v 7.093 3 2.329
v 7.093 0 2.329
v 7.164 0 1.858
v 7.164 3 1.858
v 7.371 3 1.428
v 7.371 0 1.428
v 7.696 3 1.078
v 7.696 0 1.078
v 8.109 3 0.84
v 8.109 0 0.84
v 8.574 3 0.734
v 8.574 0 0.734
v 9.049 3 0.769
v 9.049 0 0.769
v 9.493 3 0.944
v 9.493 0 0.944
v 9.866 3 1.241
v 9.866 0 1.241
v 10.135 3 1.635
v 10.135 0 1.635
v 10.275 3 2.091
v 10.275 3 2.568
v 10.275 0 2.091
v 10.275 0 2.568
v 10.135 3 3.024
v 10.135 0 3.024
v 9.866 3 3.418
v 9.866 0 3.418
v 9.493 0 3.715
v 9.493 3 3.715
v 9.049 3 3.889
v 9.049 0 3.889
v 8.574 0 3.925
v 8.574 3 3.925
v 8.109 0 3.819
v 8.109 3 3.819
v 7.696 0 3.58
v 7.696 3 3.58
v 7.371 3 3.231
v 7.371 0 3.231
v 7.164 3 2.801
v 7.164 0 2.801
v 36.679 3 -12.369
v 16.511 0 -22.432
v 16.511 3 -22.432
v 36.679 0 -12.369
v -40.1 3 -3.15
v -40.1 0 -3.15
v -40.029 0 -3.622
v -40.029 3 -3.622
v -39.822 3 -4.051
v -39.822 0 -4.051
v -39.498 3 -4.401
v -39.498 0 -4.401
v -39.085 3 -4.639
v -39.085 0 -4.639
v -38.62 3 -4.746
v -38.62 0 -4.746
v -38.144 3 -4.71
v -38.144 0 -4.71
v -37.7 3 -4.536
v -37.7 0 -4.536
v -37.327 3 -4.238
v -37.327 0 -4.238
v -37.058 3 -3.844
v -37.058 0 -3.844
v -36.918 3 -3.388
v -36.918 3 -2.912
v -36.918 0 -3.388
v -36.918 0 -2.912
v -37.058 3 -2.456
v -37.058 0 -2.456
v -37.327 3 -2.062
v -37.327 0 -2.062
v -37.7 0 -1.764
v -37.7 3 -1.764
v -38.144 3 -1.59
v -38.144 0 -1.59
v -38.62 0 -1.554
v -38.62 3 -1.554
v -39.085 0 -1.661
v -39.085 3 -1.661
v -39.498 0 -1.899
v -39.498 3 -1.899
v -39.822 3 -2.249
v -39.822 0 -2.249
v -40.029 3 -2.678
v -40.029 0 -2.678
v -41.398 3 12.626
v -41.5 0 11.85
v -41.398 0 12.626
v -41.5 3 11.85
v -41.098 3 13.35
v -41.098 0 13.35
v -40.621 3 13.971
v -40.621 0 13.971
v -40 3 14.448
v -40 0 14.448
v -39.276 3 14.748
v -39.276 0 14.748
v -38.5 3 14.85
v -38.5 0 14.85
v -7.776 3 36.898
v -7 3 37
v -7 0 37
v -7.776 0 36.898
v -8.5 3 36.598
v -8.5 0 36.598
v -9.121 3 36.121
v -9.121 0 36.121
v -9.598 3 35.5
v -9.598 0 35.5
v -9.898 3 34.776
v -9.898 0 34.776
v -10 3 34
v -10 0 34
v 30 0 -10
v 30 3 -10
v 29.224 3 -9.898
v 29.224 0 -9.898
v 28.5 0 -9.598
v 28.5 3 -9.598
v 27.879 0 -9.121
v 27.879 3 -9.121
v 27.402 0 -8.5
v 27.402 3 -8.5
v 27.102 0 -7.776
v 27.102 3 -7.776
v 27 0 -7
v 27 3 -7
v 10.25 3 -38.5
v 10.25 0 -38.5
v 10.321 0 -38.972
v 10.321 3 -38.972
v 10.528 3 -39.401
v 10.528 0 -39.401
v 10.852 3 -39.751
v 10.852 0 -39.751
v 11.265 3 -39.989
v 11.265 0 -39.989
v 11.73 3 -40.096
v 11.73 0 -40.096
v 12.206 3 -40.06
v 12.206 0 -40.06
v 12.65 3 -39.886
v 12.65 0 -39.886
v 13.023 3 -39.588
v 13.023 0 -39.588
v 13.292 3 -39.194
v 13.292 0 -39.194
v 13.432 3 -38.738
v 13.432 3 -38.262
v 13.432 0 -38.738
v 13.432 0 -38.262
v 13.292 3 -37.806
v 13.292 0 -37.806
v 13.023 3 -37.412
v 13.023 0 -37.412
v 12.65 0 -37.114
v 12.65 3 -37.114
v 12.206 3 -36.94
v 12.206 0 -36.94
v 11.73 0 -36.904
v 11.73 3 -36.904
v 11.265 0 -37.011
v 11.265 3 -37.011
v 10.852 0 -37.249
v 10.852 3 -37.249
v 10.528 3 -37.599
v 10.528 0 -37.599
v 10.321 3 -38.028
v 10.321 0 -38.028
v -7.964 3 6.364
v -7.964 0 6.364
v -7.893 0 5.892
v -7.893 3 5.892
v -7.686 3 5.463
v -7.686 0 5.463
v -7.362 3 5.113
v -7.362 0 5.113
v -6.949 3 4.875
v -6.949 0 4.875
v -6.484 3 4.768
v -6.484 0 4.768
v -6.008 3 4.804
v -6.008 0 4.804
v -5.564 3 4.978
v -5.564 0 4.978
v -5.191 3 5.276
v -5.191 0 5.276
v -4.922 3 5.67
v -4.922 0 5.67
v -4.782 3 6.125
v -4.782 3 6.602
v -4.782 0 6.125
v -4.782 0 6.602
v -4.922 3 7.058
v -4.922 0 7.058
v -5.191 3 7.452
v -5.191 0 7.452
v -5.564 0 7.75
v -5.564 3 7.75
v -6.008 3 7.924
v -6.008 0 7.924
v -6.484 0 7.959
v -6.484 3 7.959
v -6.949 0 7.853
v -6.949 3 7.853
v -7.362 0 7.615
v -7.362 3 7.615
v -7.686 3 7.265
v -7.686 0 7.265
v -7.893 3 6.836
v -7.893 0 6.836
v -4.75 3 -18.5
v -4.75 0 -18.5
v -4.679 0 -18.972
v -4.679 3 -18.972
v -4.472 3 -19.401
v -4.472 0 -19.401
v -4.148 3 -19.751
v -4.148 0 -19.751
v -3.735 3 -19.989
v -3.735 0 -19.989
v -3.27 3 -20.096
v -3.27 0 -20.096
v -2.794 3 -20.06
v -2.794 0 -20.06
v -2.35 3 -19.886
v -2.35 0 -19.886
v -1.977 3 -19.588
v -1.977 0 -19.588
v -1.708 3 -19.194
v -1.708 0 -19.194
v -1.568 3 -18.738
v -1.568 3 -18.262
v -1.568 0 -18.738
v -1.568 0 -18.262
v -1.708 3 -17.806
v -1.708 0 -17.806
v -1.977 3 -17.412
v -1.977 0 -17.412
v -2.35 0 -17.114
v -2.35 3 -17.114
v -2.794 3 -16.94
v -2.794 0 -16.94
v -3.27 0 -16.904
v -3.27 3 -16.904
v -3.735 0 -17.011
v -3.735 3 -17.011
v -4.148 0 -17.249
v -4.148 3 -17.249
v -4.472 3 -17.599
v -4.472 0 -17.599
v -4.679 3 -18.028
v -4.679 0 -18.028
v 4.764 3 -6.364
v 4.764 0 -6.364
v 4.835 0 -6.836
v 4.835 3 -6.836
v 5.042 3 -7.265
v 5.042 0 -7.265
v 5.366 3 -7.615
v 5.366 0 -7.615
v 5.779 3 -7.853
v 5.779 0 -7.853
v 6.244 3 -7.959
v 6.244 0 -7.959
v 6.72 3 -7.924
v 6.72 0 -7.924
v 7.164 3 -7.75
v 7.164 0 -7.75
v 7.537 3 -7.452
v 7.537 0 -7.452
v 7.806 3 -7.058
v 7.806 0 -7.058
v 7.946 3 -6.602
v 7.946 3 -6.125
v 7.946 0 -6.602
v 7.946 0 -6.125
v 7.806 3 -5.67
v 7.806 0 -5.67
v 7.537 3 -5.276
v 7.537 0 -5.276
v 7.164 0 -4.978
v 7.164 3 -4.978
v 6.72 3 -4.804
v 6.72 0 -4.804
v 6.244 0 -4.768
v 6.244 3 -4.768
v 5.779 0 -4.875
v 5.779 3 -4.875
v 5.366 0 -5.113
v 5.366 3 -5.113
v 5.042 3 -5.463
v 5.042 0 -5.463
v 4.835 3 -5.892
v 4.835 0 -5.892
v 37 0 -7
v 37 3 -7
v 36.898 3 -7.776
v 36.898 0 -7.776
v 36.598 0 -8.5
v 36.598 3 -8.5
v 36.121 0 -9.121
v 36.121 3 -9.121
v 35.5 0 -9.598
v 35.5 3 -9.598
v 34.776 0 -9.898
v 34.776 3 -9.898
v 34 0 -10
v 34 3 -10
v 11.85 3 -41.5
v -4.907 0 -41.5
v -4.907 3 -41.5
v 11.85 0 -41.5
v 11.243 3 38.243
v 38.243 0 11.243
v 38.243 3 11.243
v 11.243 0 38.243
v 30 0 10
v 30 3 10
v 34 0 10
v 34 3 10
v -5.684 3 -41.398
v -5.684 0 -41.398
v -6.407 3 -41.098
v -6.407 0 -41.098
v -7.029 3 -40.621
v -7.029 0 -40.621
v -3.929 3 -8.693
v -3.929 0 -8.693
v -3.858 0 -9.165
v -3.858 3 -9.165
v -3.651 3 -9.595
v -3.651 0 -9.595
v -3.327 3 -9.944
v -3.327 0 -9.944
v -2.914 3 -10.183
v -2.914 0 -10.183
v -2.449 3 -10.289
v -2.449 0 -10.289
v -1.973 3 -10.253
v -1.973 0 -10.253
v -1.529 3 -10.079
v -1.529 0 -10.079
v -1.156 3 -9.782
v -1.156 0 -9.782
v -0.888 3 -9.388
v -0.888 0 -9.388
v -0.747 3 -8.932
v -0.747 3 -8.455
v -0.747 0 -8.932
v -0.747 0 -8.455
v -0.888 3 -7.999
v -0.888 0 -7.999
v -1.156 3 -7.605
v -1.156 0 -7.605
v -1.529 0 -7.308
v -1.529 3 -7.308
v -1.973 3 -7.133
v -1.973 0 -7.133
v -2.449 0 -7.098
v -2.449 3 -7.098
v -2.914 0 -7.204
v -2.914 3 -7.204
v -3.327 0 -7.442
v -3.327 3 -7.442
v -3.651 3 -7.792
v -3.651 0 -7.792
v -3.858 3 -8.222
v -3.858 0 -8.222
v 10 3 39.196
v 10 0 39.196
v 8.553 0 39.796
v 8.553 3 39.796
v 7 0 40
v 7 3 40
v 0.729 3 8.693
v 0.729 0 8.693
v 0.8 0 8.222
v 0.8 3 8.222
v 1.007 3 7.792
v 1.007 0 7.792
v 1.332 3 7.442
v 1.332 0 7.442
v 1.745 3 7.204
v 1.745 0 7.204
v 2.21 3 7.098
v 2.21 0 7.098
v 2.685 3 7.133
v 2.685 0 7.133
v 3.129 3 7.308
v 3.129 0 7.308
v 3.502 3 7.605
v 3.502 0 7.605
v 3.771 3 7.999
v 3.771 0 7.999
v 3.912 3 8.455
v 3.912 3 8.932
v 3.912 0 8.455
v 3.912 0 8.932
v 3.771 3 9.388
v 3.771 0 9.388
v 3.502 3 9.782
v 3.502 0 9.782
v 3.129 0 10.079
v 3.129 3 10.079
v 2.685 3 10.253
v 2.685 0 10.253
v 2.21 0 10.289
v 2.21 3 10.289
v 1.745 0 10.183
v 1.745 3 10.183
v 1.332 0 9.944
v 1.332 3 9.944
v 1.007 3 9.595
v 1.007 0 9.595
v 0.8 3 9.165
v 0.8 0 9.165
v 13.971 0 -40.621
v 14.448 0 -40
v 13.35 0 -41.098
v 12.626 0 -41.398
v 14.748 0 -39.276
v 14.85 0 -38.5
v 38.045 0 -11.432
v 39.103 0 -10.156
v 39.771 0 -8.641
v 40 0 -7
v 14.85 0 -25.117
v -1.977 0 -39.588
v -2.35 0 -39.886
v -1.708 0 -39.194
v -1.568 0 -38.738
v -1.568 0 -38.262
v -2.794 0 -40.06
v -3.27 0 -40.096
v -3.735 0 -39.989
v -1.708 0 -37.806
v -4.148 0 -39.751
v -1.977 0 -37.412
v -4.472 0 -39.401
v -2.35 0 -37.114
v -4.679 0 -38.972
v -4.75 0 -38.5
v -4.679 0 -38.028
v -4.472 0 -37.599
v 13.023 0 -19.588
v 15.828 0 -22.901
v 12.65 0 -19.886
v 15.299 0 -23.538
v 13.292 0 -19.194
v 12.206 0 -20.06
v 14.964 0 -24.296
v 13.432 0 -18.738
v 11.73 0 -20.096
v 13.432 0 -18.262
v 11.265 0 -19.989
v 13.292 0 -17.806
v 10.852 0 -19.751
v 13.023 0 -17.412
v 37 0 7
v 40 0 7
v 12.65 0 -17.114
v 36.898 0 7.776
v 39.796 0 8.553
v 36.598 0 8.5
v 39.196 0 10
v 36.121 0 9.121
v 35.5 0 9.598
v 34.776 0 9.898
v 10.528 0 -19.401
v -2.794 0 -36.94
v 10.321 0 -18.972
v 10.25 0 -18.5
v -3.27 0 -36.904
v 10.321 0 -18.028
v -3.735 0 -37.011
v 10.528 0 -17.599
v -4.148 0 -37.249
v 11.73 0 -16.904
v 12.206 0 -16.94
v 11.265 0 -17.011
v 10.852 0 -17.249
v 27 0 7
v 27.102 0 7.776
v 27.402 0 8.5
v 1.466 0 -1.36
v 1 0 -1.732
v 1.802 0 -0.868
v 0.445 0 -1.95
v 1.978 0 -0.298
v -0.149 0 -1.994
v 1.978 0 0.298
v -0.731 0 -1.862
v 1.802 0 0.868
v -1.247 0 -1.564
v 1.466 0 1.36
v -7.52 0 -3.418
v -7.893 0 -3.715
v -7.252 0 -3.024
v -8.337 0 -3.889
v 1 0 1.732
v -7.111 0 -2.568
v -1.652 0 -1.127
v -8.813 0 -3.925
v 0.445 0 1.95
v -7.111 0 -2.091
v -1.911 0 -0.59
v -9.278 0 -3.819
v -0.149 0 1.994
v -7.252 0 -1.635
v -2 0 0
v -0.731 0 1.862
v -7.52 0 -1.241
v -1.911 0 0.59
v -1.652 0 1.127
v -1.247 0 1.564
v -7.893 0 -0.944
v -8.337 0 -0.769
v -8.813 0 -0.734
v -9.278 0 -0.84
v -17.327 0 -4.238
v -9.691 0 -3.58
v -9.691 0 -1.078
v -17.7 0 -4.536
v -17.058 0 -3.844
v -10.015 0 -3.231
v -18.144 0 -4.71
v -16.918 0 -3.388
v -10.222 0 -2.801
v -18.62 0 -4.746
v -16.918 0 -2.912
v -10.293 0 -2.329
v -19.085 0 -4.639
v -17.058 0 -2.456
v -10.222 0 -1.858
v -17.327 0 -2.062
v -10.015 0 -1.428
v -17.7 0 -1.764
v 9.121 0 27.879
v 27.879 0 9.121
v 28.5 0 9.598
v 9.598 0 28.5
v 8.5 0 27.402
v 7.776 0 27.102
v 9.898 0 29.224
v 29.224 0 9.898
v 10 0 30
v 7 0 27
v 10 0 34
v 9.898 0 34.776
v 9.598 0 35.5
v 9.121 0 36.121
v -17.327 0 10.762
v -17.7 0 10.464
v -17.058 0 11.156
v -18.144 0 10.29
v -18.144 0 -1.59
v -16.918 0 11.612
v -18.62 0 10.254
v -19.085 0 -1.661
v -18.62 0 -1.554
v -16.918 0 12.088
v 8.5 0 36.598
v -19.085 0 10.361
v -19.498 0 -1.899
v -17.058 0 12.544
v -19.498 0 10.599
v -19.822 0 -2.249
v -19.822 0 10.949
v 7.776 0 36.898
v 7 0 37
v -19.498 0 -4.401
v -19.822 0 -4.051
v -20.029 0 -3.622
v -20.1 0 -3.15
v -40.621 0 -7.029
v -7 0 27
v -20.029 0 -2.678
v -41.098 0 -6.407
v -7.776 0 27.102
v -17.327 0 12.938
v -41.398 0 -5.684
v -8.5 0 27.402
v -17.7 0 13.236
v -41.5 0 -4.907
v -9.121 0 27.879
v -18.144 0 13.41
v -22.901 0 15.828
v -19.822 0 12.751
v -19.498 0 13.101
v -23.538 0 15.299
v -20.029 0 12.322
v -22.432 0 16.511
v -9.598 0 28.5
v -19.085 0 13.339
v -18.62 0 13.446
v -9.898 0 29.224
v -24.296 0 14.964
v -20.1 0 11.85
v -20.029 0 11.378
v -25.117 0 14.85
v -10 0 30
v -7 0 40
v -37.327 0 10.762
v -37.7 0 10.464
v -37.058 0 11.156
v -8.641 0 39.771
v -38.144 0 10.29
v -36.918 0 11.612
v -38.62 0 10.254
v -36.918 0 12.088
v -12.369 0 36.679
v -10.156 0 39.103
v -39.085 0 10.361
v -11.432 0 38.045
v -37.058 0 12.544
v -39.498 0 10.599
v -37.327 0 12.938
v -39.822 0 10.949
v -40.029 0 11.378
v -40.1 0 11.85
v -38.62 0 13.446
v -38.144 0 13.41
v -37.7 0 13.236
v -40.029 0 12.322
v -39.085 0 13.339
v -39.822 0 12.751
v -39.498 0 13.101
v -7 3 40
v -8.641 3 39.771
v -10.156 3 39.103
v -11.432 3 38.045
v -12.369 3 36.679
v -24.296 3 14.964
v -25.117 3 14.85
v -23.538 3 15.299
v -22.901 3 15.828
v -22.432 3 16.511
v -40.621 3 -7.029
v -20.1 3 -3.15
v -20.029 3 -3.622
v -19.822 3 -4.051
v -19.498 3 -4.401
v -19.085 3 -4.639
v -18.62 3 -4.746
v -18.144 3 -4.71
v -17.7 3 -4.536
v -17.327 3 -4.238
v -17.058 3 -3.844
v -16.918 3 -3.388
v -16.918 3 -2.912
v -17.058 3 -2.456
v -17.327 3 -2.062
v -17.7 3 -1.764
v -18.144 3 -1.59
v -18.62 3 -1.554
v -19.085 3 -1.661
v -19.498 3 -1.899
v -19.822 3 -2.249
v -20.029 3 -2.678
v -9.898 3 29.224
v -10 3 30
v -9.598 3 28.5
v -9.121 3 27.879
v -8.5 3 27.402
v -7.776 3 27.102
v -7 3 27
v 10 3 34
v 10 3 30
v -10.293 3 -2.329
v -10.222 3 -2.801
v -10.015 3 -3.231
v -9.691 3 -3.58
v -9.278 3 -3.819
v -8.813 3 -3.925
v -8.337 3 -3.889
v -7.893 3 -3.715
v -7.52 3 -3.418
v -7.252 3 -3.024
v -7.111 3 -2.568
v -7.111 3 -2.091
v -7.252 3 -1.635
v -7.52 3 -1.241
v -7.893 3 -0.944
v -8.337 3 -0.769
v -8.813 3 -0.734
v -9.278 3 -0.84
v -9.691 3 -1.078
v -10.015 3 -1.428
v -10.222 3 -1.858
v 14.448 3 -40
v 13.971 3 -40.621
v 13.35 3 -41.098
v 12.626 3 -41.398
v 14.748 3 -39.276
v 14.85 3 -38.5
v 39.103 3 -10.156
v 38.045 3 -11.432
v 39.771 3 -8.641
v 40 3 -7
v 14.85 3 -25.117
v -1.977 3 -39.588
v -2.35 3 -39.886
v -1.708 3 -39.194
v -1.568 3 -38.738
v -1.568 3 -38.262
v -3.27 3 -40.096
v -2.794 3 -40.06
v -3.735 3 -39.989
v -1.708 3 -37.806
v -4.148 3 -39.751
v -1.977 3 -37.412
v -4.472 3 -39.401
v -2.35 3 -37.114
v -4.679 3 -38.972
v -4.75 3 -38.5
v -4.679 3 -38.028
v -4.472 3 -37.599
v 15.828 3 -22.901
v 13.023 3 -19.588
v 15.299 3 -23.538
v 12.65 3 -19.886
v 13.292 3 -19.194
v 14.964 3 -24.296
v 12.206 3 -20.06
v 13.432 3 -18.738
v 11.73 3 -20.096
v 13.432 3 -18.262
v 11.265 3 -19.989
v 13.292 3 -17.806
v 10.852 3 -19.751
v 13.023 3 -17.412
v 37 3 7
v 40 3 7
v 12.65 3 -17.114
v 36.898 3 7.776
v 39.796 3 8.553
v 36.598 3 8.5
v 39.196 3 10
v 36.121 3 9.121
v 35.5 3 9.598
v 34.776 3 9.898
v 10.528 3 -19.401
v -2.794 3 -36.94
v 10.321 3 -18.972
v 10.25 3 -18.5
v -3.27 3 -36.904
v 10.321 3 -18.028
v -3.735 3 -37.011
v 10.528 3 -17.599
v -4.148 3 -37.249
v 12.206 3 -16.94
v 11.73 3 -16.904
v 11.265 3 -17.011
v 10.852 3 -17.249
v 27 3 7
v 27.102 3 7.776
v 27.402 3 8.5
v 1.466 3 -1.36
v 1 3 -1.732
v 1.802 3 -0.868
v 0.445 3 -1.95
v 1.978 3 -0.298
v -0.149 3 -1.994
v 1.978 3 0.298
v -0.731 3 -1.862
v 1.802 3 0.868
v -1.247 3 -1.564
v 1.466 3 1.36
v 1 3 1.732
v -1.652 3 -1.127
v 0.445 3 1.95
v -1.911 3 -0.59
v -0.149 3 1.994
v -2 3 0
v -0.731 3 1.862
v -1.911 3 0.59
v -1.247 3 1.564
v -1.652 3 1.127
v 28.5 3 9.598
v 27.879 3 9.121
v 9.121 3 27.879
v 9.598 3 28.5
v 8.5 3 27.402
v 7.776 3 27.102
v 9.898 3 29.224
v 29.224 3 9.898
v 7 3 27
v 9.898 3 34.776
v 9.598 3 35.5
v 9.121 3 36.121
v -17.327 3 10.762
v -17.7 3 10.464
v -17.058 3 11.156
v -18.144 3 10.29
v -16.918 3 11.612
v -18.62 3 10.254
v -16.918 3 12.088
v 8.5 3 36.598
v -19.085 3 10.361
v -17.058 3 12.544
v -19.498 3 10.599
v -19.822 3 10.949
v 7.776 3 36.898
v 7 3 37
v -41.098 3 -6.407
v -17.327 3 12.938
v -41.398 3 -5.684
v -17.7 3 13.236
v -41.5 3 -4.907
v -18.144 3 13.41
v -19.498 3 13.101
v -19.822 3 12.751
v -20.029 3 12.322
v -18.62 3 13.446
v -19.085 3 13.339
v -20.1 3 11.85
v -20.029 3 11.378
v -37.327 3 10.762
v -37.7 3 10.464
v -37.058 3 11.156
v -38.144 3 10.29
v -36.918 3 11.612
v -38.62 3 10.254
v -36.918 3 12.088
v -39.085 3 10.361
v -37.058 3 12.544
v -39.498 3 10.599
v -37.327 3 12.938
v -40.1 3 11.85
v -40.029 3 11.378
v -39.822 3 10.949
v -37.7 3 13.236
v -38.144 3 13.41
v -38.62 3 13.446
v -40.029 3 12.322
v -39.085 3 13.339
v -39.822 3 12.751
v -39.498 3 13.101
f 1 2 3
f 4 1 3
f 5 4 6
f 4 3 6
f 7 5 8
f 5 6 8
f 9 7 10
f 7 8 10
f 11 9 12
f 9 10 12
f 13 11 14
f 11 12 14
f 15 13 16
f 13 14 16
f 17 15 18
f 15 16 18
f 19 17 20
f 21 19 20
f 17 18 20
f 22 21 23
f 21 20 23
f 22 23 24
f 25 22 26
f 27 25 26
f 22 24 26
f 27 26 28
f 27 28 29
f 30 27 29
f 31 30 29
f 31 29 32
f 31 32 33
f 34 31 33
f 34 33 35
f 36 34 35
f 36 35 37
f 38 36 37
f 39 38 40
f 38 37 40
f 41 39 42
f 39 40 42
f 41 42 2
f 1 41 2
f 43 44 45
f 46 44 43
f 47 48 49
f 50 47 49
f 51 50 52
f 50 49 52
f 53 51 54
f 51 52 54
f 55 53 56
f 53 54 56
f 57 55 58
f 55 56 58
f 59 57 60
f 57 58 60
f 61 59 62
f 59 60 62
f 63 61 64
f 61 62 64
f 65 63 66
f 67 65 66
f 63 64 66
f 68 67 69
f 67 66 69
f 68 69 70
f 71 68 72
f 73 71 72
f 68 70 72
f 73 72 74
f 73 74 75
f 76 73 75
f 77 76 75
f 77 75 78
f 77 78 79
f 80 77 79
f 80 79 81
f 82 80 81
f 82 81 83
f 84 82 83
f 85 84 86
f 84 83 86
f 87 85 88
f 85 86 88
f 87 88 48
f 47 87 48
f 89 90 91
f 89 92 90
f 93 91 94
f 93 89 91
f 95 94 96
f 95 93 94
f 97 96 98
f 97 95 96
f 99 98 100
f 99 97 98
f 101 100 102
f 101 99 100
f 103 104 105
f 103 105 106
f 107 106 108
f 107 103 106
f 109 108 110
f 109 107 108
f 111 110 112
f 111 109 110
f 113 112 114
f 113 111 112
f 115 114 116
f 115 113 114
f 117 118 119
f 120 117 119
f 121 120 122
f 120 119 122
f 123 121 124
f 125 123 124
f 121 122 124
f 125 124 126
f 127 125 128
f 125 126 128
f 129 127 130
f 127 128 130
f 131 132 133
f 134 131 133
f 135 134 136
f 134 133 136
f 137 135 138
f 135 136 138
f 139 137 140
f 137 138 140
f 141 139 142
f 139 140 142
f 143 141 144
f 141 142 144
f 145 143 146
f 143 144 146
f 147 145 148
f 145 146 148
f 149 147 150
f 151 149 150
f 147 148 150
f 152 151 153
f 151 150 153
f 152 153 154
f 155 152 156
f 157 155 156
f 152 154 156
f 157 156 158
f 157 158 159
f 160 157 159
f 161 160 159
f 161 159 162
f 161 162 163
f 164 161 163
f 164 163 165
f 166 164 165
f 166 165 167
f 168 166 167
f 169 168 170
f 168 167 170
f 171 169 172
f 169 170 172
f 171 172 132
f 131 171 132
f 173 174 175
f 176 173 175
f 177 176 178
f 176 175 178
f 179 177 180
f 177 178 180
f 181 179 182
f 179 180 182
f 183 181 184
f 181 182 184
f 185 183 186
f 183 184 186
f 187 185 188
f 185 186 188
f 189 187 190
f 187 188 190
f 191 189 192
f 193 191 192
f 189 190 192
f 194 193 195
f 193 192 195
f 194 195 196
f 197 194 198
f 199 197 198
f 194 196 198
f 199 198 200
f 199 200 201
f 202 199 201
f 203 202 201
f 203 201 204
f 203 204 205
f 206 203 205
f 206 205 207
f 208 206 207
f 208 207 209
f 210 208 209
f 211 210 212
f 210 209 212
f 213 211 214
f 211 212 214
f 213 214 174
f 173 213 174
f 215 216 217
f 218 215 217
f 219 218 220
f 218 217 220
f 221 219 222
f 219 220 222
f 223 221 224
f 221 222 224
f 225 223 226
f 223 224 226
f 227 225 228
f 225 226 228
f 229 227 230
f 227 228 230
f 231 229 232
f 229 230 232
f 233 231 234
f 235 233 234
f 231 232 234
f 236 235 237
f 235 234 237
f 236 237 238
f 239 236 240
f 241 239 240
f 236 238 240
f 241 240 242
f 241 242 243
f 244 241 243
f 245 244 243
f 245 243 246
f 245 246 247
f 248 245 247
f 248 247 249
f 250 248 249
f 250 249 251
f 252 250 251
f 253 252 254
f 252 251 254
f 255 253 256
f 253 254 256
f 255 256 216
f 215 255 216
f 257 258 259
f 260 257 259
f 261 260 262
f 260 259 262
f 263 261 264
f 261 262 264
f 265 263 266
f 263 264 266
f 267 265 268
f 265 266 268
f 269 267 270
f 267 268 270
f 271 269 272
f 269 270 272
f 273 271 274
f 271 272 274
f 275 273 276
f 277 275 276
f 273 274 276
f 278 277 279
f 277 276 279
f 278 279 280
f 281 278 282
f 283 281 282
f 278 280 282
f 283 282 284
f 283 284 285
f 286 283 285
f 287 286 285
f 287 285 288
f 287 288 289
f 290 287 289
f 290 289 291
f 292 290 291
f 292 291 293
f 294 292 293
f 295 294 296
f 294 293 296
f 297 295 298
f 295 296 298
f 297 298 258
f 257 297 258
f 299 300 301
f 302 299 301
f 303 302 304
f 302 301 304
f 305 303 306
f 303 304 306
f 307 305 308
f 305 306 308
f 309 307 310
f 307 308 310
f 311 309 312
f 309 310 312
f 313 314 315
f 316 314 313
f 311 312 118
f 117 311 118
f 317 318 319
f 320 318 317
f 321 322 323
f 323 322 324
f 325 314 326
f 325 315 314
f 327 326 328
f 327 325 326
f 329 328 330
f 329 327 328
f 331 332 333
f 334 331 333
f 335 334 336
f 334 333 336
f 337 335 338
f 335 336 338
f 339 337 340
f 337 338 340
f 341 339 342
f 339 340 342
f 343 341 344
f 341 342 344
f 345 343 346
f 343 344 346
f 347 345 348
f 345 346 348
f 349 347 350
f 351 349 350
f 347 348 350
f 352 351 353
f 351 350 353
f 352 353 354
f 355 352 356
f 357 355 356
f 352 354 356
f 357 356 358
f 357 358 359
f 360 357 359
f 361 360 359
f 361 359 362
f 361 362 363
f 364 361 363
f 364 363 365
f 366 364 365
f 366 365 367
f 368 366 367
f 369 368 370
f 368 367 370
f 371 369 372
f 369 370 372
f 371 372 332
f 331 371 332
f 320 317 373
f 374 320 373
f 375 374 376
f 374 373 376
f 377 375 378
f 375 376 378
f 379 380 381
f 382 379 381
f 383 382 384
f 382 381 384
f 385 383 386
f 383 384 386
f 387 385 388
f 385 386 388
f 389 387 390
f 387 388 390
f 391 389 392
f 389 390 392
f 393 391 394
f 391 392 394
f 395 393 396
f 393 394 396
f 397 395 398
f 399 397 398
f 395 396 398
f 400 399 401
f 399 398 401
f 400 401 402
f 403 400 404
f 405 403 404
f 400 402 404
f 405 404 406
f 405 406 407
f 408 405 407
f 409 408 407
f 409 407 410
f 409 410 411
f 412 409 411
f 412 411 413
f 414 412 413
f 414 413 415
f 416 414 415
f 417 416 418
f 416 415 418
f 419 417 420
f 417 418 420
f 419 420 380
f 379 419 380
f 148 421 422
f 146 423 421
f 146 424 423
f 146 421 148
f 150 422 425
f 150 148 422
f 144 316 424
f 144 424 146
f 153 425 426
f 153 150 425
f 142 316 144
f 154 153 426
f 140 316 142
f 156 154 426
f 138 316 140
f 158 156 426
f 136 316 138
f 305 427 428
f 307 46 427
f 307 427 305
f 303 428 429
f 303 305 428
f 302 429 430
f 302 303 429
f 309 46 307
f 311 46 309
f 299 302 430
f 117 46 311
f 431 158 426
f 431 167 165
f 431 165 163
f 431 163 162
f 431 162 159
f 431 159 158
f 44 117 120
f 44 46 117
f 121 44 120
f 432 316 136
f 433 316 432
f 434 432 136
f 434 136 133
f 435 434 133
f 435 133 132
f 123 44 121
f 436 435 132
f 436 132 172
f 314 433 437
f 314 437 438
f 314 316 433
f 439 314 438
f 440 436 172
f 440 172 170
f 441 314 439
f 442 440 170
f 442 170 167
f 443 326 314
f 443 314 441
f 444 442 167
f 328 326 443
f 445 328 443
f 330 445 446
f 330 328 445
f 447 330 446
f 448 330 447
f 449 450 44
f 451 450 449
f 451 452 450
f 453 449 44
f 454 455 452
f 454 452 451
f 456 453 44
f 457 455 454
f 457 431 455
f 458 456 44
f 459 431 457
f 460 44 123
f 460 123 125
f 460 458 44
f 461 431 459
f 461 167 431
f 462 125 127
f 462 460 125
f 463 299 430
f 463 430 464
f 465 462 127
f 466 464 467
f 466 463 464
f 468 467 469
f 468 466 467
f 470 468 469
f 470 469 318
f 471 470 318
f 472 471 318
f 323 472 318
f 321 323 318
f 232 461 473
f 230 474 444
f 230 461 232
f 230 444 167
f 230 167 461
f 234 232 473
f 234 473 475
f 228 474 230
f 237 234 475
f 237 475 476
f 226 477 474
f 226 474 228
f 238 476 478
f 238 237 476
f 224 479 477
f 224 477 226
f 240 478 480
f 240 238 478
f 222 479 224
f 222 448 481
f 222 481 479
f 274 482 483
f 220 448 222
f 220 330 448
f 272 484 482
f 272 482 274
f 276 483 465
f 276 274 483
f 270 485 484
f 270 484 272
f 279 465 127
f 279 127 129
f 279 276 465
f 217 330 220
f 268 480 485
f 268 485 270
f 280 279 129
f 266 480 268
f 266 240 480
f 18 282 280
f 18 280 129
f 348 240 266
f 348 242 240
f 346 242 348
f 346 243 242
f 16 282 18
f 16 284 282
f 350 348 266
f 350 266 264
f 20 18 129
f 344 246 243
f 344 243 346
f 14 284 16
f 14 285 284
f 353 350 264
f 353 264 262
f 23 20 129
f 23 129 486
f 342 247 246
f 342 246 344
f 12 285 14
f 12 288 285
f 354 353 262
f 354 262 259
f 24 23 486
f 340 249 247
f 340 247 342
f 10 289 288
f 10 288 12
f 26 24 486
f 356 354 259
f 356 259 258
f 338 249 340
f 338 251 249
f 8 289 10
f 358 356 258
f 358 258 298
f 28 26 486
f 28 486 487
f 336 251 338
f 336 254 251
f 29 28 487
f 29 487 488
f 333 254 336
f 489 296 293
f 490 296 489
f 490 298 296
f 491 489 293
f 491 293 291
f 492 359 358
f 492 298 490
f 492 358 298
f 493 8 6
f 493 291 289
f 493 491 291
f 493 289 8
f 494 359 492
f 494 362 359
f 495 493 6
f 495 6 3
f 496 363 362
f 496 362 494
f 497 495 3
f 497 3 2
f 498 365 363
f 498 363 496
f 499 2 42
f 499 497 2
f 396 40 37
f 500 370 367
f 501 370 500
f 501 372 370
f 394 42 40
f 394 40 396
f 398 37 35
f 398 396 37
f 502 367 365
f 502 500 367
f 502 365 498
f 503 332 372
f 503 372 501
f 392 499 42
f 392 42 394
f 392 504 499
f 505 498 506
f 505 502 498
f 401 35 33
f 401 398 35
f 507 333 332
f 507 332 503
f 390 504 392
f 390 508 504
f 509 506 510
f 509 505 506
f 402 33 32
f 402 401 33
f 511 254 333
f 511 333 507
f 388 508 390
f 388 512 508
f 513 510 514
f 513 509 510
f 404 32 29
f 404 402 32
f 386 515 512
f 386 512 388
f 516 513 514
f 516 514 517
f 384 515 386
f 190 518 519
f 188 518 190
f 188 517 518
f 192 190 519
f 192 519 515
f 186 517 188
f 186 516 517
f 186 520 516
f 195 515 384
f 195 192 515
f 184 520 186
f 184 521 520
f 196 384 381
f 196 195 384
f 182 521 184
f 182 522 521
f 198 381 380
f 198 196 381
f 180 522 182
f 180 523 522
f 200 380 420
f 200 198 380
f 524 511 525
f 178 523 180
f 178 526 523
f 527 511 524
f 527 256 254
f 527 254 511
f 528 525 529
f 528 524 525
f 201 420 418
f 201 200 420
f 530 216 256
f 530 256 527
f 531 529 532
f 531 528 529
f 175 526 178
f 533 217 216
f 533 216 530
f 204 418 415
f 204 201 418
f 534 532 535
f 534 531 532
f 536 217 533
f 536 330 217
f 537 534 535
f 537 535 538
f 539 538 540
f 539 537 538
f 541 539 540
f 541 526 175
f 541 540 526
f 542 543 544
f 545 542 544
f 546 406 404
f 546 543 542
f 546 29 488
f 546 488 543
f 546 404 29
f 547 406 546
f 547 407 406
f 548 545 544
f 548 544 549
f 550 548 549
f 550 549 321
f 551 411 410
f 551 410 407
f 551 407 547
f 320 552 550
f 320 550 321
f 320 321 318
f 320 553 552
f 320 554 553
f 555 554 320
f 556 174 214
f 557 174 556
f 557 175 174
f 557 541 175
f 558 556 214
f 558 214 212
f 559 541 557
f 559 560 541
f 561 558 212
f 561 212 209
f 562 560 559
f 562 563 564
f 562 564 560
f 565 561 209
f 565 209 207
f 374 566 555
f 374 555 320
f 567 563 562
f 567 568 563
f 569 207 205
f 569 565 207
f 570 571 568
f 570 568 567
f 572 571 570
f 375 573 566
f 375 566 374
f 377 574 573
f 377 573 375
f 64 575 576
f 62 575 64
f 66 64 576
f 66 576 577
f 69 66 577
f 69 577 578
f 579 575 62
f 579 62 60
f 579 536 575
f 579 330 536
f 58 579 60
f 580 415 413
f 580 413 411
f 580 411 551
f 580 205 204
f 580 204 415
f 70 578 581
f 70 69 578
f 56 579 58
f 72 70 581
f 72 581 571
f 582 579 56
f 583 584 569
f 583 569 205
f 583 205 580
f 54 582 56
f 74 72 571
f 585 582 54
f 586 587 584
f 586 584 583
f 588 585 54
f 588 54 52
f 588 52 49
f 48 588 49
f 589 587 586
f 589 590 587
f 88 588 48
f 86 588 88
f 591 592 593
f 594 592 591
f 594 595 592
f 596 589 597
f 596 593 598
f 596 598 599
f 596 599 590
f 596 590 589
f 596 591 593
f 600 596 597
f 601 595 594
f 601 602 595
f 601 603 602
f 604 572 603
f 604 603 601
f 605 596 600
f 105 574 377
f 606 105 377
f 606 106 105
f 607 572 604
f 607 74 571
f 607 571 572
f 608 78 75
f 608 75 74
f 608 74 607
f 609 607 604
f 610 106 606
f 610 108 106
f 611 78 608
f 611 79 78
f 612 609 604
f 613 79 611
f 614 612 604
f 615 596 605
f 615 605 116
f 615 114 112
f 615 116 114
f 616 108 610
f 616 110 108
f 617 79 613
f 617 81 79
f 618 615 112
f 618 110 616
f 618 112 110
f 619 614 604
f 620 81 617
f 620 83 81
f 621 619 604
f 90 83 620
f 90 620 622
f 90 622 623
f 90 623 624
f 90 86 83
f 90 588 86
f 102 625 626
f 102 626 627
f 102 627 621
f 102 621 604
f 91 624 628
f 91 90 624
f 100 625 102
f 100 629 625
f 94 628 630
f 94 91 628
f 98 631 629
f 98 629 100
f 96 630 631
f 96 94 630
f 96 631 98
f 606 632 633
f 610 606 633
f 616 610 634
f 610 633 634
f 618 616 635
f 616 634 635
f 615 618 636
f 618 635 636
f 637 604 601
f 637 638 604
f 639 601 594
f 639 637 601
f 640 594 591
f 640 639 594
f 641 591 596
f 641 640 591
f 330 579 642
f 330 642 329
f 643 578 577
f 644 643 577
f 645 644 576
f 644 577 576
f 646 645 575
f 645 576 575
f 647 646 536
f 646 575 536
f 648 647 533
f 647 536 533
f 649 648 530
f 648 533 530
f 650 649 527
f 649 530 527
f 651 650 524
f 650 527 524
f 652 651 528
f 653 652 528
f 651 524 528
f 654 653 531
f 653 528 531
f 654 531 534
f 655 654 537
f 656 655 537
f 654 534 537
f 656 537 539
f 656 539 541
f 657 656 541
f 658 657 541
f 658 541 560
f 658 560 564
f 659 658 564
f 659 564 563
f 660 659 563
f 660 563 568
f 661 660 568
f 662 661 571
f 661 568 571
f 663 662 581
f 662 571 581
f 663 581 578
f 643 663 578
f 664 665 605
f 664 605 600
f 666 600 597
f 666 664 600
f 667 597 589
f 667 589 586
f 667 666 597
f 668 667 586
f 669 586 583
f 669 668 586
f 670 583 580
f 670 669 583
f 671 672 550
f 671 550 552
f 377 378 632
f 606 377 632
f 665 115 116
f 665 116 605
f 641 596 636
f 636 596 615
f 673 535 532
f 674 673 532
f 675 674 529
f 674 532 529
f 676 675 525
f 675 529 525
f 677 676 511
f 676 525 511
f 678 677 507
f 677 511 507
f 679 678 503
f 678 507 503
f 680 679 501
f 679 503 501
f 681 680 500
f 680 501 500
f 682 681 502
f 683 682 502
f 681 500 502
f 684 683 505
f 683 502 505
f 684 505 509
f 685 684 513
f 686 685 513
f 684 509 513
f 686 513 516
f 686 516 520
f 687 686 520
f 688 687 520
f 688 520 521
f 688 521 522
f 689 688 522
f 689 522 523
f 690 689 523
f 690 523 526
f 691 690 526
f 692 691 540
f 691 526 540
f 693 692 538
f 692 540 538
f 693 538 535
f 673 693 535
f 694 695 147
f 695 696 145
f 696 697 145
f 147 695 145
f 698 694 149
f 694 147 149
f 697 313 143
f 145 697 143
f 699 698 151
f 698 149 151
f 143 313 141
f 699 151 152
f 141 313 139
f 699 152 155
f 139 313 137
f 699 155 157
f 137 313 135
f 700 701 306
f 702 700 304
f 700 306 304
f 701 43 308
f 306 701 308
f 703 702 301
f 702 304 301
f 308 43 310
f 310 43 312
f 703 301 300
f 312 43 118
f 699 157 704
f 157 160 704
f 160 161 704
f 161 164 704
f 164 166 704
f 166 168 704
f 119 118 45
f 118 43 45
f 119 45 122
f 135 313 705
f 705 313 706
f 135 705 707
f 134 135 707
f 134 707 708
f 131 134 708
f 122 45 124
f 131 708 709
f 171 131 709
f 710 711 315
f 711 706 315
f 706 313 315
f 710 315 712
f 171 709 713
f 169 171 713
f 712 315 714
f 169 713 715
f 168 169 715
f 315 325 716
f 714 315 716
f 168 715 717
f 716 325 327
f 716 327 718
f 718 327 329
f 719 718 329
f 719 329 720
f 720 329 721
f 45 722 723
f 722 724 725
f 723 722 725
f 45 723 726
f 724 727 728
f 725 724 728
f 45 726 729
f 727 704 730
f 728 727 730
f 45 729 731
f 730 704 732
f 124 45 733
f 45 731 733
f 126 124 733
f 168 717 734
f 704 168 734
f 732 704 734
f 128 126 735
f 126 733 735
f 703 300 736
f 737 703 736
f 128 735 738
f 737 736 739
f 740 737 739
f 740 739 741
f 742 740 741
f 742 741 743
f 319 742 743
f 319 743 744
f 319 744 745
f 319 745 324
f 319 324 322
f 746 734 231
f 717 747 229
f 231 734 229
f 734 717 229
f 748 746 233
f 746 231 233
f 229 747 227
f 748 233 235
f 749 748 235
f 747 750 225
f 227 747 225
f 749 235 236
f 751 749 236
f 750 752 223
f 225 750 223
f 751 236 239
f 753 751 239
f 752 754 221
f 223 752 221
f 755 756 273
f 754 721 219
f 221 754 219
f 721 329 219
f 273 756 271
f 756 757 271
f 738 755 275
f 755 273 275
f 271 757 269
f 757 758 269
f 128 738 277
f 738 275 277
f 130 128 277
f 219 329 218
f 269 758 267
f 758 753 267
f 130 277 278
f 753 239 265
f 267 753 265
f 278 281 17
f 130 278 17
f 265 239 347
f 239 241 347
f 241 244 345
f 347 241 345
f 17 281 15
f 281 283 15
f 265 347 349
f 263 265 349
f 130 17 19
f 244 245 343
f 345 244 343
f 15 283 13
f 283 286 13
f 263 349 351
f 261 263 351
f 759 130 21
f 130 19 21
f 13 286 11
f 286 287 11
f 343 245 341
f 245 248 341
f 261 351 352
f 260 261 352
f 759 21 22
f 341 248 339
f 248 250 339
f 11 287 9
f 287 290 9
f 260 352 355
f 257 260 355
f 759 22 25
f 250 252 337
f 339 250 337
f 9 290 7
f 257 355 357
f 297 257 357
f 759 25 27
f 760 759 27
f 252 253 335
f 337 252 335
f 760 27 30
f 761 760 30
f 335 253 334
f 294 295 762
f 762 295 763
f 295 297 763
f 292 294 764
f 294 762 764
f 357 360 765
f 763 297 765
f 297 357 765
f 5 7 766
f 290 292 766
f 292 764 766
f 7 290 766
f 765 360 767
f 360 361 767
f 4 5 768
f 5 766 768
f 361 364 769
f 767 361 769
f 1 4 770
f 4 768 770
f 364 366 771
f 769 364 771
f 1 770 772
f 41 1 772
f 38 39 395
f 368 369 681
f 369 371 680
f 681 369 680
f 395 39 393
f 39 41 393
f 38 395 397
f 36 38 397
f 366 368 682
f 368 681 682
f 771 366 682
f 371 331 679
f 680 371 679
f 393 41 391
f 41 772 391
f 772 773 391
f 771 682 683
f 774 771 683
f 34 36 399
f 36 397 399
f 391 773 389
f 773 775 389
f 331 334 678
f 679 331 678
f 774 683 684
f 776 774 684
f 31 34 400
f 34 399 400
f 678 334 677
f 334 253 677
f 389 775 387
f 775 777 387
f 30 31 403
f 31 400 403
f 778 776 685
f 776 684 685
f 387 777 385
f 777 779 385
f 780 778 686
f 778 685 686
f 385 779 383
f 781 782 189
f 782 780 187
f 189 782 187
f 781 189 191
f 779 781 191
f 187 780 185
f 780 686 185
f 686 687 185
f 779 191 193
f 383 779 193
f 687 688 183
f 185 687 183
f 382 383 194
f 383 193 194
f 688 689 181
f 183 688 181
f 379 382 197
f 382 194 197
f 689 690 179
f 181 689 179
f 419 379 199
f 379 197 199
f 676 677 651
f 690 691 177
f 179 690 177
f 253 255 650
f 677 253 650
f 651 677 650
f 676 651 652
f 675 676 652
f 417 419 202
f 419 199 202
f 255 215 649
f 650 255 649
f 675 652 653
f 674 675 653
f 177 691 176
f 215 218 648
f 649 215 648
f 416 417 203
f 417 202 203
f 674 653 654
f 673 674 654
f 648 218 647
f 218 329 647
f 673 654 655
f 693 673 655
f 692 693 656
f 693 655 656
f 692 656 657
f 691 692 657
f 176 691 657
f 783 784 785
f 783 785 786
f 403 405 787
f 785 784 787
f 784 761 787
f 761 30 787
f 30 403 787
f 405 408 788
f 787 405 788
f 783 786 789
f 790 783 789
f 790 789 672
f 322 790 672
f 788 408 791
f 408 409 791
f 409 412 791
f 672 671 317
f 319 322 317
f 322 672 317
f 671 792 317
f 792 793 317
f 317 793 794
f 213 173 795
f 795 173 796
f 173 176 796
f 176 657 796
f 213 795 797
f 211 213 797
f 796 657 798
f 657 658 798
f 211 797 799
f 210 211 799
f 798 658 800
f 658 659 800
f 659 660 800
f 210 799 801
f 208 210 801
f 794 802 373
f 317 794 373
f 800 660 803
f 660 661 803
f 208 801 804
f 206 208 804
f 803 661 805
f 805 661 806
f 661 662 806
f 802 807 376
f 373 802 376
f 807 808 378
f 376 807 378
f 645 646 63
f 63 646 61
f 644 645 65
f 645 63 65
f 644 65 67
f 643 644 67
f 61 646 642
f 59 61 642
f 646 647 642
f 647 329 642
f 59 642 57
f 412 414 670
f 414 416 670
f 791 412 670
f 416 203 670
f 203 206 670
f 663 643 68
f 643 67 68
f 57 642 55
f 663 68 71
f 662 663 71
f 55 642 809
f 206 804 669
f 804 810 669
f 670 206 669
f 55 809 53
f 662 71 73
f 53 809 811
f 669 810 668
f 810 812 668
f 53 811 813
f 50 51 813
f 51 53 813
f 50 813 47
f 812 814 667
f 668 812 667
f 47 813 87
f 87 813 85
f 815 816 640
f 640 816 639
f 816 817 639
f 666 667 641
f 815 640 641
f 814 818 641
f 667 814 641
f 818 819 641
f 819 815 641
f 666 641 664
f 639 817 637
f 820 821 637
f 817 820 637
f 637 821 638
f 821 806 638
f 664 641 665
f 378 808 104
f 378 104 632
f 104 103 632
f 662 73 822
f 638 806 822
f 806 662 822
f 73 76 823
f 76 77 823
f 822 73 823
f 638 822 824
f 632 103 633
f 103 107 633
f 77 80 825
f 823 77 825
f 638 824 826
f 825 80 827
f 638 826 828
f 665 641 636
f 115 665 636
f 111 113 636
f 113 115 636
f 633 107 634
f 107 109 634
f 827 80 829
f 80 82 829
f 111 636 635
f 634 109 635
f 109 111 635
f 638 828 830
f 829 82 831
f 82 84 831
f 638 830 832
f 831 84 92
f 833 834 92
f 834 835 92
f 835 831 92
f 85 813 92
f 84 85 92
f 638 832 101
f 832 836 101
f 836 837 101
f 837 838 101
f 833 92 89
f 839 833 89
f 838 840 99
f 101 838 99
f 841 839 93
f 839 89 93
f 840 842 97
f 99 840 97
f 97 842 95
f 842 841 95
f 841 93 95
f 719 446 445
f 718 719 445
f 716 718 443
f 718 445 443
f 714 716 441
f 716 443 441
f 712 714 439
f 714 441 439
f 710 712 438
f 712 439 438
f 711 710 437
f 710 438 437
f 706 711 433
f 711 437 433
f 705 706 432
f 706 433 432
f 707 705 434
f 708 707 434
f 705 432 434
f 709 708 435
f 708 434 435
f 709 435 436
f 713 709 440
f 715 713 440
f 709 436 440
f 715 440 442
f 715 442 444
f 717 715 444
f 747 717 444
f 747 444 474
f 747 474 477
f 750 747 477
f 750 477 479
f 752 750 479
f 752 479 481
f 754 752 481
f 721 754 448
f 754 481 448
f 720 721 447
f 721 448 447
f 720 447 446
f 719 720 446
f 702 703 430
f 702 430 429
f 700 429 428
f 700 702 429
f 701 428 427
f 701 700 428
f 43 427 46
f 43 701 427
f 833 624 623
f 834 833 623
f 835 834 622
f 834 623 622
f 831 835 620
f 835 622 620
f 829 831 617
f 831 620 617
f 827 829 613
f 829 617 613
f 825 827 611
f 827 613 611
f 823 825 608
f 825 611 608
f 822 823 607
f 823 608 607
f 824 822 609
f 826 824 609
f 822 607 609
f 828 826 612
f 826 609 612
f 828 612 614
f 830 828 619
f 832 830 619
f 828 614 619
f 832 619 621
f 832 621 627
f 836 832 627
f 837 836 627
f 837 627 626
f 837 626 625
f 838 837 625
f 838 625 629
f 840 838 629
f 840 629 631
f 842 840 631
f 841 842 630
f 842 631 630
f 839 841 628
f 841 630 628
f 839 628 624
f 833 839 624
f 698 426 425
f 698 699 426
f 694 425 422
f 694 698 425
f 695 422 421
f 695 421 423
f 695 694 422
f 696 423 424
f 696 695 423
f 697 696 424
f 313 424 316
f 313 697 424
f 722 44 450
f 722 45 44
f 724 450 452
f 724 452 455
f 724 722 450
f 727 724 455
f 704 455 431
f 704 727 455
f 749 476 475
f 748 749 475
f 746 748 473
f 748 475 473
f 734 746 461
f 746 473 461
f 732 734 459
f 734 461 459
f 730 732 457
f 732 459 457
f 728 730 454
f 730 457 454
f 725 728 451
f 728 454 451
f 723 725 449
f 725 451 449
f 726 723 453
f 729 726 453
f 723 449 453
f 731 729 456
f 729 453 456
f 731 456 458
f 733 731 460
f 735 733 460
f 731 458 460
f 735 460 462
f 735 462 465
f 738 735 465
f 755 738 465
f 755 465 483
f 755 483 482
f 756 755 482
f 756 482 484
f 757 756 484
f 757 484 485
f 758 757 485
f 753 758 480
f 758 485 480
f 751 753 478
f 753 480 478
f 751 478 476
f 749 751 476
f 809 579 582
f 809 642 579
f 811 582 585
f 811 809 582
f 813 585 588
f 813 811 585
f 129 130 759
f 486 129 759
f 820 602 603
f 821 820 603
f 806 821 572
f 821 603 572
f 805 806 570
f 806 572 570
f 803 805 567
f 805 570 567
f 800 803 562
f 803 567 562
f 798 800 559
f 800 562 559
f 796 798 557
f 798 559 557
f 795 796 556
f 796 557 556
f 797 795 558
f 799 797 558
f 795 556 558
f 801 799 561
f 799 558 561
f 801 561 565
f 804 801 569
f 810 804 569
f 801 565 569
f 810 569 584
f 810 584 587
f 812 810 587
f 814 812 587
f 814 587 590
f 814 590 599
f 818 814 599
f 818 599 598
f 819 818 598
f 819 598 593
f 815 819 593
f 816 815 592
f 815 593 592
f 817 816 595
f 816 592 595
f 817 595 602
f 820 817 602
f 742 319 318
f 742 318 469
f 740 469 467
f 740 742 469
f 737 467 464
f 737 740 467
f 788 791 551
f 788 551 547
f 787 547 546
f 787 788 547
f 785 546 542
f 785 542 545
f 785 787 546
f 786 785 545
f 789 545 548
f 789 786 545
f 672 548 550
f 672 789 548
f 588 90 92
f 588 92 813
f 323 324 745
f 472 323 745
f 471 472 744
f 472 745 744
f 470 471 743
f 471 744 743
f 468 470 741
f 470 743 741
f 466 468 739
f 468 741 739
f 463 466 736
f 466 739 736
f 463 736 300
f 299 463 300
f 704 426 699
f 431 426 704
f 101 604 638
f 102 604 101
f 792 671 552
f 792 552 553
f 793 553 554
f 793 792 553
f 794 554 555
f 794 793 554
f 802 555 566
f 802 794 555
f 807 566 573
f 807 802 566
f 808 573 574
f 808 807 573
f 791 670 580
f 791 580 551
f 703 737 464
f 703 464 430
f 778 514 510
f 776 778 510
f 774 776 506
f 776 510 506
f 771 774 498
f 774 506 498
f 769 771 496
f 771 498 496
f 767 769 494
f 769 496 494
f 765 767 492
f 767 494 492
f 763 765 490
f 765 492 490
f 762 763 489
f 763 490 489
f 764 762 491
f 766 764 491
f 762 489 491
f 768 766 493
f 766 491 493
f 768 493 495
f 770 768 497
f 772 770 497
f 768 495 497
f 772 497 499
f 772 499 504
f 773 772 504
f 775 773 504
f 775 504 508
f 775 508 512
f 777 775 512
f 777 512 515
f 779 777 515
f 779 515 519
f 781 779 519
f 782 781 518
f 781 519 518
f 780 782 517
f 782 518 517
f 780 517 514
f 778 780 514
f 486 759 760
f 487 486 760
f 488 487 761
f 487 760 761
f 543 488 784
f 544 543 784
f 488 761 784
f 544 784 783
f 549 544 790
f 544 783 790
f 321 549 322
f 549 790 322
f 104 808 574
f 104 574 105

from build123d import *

# Parameters (mm, degrees)
BOSS_EXTRUDE1_DEPTH      = 3
M3_CLEARANCE_HOLE1_D     = 3.2
M3_CLEARANCE_HOLE2_D     = 3.2
F_4_0_4_DIAMETER_HOLE1_D = 4
EXTRUDE_THIN1_DEPTH      = 3
BOSS_EXTRUDE4_START      = -3
BOSS_EXTRUDE4_DEPTH      = 3
FILLET4_R                = 3


with BuildPart() as part:
    # Sketch2 → Boss-Extrude1 (new body)
    with BuildSketch(Plane(origin=(0, 0, 0), x_dir=(1, 0, 0), z_dir=(0, 1, 0))):
        with BuildLine():
            Line((-6.15, 41.5), (14.85, 41.5))
            Line((14.85, 41.5), (14.85, 15.5))
            Line((14.85, 15.5), (13.66471398, -0.982645329))
            ThreePointArc((13.66471398, -0.982645329), (9.687362902, -9.687362902), (0.982645329, -13.66471398))
            Line((0.982645329, -13.66471398), (-15.5, -14.85))
            Line((-15.5, -14.85), (-41.5, -14.85))
            Line((-41.5, -14.85), (-41.5, 6.15))
            Line((-41.5, 6.15), (-6.15, 41.5))
        make_face()
    extrude(amount=BOSS_EXTRUDE1_DEPTH)

    # M3 Clearance Hole1 (through all)
    with Locations(Plane(origin=(0, 3, 0), x_dir=(1, 0, 0), z_dir=(0, 1, 0))):
        with Locations((-38.5, 3.15), (-18.5, 3.15), (-18.5, -11.85), (-38.5, -11.85), (-3.15, 18.5), (-3.15, 38.5), (11.85, 38.5), (11.85, 18.5)):
            Hole(M3_CLEARANCE_HOLE1_D / 2)

    # M3 Clearance Hole2 (through all)
    with Locations(Plane(origin=(0, 3, 0), x_dir=(1, 0, 0), z_dir=(0, 1, 0))):
        with Locations((-2.329371406, 8.693332437), (6.363961031, 6.363961031), (8.693332437, -2.329371406), (2.329371406, -8.693332437), (-6.363961031, -6.363961031), (-8.693332437, 2.329371406)):
            Hole(M3_CLEARANCE_HOLE2_D / 2)

    # Ø4.0 (4) Diameter Hole1 (through all)
    with Locations(Plane(origin=(0, 3, 0), x_dir=(1, 0, 0), z_dir=(0, 1, 0))):
        with Locations((0, 0)):
            Hole(F_4_0_4_DIAMETER_HOLE1_D / 2)



with BuildPart() as body_2:
    # Sketch11 → Extrude-Thin1 (new body)
    with BuildSketch(Plane(origin=(0, 3, 0), x_dir=(1, 0, 0), z_dir=(0, 1, 0))):
        with BuildLine():
            Line((-7, -24), (7, -24))
            ThreePointArc((7, -24), (11.242640687, -25.757359313), (13, -30))
            Line((13, -30), (13, -34))
            ThreePointArc((13, -34), (11.242640687, -38.242640687), (7, -40))
            Line((7, -40), (-7, -40))
            ThreePointArc((-7, -40), (-11.242640687, -38.242640687), (-13, -34))
            Line((-13, -34), (-13, -30))
            ThreePointArc((-13, -30), (-11.242640687, -25.757359313), (-7, -24))
        make_face()
        with BuildLine():
            Line((-7, -27), (7, -27))
            ThreePointArc((7, -27), (9.121320344, -27.878679656), (10, -30))
            Line((10, -30), (10, -34))
            ThreePointArc((10, -34), (9.121320344, -36.121320344), (7, -37))
            Line((7, -37), (-7, -37))
            ThreePointArc((-7, -37), (-9.121320344, -36.121320344), (-10, -34))
            Line((-10, -34), (-10, -30))
            ThreePointArc((-10, -30), (-9.121320344, -27.878679656), (-7, -27))
        make_face(mode=Mode.SUBTRACT)
    extrude(amount=-EXTRUDE_THIN1_DEPTH)


with BuildPart() as part_1:
    add(part.part)

    add(body_2.part)  # Boss-Extrude4 merges body 2
    # Sketch12 → Boss-Extrude4 (add)
    with BuildSketch(Plane(origin=(0, 3, 0), x_dir=(1, 0, 0), z_dir=(0, 1, 0)).offset(BOSS_EXTRUDE4_START)):
        with BuildLine():
            Line((11.242640687, -38.242640687), (24.742640687, -24.742640687))
            Line((24.742640687, -24.742640687), (9.687362902, -9.687362902))
            ThreePointArc((9.687362902, -9.687362902), (5.693601612, -12.460854733), (0.982645329, -13.66471398))
            Line((0.982645329, -13.66471398), (-15.5, -14.85))
            Line((-15.5, -14.85), (-23.260783473, -14.85))
            Line((-23.260783473, -14.85), (-12.368766817, -36.678869699))
            ThreePointArc((-12.368766817, -36.678869699), (-12.84005997, -35.376117563), (-13, -34))
            Line((-13, -34), (-13, -30))
            ThreePointArc((-13, -30), (-11.242640687, -25.757359313), (-7, -24))
            Line((-7, -24), (7, -24))
            ThreePointArc((7, -24), (11.242640687, -25.757359313), (13, -30))
            Line((13, -30), (13, -34))
            ThreePointArc((13, -34), (12.543277195, -36.296100594), (11.242640687, -38.242640687))
        make_face()
    extrude(amount=BOSS_EXTRUDE4_DEPTH)

    # Mirror4: part across plane


with BuildPart() as part_2:
    add(part_1.part)
    add(part_1.part.mirror(Plane(origin=(0, 0, 0), x_dir=(0.7071067811865478, 0, 0.7071067811865472), z_dir=(-0.7071067811865475, 0, 0.7071067811865477))))

    # Fillet4
    fillet4_edges = [part_2.edges().sort_by_distance(p)[0] for p in [
        (-23.260783473, 1.5, 14.85),
        (-6.15, 1.5, -41.5),
        (14.85, 1.5, -41.5),
        (-41.5, 1.5, 14.85),
        (-41.5, 1.5, -6.15),
        (14.85, 1.5, -23.260783473),
    ]]
    fillet(fillet4_edges, radius=FILLET4_R)


solid = part_2.part
